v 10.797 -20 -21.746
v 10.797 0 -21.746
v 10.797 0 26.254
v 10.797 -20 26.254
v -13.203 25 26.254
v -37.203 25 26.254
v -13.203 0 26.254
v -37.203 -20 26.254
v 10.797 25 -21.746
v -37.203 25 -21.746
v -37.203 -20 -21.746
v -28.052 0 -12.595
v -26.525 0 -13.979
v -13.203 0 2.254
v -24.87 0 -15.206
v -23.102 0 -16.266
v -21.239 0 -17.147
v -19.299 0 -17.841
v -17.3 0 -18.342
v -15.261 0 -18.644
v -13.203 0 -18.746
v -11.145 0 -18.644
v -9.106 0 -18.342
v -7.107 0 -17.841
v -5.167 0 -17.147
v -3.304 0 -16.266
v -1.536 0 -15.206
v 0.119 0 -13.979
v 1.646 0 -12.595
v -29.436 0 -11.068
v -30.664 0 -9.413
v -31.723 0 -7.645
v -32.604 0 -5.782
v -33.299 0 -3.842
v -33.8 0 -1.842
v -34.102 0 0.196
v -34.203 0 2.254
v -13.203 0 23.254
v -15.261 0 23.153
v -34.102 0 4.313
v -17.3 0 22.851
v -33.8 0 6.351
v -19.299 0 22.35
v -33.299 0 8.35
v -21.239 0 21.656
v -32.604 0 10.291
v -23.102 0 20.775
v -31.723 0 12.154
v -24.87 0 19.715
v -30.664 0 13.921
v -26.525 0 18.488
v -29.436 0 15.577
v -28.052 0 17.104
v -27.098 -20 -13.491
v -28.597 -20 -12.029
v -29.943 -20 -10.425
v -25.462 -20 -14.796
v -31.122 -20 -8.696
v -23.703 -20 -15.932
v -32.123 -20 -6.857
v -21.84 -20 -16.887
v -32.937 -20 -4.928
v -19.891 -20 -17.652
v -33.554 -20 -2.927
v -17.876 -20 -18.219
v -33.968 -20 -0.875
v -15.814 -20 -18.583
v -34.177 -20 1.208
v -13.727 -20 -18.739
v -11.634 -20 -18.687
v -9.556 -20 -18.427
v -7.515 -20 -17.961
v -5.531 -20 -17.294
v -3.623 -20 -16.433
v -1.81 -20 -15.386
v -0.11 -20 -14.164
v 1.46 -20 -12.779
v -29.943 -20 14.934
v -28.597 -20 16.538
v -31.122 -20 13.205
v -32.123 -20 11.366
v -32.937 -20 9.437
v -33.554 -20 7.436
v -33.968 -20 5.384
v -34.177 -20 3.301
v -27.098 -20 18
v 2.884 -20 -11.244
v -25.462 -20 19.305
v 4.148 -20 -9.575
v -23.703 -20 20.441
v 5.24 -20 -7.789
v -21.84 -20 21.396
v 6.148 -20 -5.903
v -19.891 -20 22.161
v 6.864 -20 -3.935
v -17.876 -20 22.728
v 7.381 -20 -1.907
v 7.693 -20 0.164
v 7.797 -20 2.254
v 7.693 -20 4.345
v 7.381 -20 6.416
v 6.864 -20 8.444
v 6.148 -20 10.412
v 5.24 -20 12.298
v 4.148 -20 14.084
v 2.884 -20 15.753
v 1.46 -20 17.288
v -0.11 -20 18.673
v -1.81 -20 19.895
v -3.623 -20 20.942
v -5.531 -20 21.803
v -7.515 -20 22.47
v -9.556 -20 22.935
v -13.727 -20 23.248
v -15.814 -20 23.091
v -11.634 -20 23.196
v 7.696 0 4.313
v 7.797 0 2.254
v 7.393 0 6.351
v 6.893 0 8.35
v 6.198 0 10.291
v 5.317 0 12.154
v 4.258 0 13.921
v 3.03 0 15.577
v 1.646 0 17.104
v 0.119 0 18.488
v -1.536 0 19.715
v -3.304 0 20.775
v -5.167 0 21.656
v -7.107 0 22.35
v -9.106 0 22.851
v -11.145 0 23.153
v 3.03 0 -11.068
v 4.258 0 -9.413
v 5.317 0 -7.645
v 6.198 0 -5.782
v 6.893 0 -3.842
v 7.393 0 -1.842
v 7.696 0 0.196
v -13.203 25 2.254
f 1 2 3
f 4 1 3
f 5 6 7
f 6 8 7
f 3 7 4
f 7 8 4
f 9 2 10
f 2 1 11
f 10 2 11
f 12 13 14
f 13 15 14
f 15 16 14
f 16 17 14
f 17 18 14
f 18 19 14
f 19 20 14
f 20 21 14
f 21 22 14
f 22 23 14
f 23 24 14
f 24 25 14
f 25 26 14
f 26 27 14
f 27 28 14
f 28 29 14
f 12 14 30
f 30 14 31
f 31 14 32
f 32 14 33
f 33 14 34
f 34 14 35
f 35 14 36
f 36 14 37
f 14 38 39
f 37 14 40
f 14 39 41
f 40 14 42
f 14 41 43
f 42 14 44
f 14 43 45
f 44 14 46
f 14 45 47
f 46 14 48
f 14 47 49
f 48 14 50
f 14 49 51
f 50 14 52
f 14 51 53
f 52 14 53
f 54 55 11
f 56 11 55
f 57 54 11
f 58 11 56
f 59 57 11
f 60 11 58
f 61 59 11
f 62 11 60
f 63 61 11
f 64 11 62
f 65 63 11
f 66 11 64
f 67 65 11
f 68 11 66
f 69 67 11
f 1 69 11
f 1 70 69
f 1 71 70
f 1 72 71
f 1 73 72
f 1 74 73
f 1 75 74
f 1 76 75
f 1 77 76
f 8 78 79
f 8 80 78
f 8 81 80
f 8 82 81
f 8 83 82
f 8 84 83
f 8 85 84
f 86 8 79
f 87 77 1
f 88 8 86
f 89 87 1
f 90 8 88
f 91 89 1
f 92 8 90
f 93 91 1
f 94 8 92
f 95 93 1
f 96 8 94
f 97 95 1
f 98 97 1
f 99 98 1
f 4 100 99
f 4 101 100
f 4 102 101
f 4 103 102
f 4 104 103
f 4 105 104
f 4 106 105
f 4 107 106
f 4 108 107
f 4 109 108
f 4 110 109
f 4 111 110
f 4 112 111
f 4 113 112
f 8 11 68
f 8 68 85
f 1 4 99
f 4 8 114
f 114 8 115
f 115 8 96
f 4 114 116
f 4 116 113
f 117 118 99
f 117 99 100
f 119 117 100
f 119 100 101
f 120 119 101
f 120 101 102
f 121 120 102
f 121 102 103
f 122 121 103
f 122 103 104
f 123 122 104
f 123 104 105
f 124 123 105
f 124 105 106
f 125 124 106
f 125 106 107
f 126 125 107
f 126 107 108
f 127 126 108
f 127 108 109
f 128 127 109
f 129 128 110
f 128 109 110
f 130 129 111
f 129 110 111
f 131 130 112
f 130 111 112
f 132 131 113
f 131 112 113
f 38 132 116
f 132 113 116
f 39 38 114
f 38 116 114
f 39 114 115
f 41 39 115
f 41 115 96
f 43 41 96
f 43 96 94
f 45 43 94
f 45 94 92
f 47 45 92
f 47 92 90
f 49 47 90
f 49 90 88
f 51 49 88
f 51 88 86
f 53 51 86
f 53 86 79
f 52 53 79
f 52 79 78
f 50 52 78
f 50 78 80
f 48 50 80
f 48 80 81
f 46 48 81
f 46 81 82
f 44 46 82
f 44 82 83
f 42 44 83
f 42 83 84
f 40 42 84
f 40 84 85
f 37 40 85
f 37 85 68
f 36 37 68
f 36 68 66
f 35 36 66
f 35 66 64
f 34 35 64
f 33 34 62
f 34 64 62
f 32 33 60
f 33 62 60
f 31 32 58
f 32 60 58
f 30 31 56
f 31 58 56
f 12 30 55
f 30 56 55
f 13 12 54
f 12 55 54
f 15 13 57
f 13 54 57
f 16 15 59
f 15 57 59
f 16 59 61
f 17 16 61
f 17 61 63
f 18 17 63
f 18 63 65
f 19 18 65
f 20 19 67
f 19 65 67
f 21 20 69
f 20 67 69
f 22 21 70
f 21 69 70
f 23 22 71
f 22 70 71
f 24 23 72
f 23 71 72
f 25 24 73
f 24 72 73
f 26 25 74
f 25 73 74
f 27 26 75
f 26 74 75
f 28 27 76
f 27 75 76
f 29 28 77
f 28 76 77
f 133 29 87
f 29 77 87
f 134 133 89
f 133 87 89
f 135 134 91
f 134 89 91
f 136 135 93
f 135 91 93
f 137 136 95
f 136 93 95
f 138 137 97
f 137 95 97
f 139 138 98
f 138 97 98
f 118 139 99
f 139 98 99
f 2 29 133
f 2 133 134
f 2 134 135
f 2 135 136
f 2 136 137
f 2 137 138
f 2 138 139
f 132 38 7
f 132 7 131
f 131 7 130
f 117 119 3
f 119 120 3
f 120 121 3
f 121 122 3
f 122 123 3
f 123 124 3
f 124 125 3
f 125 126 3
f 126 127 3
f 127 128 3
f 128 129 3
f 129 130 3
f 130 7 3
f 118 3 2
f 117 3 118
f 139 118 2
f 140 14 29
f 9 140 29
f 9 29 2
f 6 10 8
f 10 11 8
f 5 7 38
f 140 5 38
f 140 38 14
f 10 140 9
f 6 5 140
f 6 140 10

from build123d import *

# Parameters (mm, degrees)
F1_DEPTH = 20
F3_D     = 42
F3_DEPTH = 50
F3_TIP   = 12.6180729996
F4_DEPTH = 25


with BuildPart() as f1:
    # F0 (on Front) → F1 (new body)
    with BuildSketch(Plane.XZ):
        Polygon((-13.2030190676, 2.2544430345), (-37.2030190676, 26.2544430345), (-37.2030190676, -21.7455569655), align=None)
        Polygon((10.7969809324, 26.2544430345), (-37.2030190676, 26.2544430345), (-13.2030190676, 2.2544430345), align=None)
        Polygon((10.7969809324, -21.7455569655), (10.7969809324, 26.2544430345), (-13.2030190676, 2.2544430345), align=None)
        Polygon((-13.2030190676, 2.2544430345), (-37.2030190676, -21.7455569655), (10.7969809324, -21.7455569655), align=None)
    extrude(amount=F1_DEPTH)

    # F3
    with Locations(Plane(origin=(0, 0, 0), x_dir=(-1, 0, 0), z_dir=(0, 1, 0))):
        with Locations((13.2030190676, 2.2544430345)):
            Hole(F3_D / 2, depth=F3_DEPTH)
            with Locations((0, 0, -(F3_DEPTH + F3_TIP / 2))):  # 118° drill point
                Cone(0, F3_D / 2, F3_TIP, mode=Mode.SUBTRACT)

    # F2 (on face) → F4 (join)
    with BuildSketch(Plane(origin=(0, 0, 0), x_dir=(-1, 0, 0), z_dir=(0, 1, 0))):
        Polygon((-10.7969809324, -21.7455569655), (37.2030190676, -21.7455569655), (13.2030190676, 2.2544430345), align=None)
        Polygon((13.2030190676, 26.2544430345), (13.2030190676, 2.2544430345), (37.2030190676, 26.2544430345), align=None)
        Polygon((13.2030190676, 2.2544430345), (37.2030190676, -21.7455569655), (37.2030190676, 26.2544430345), align=None)
    extrude(amount=F4_DEPTH)


solid = f1.part
